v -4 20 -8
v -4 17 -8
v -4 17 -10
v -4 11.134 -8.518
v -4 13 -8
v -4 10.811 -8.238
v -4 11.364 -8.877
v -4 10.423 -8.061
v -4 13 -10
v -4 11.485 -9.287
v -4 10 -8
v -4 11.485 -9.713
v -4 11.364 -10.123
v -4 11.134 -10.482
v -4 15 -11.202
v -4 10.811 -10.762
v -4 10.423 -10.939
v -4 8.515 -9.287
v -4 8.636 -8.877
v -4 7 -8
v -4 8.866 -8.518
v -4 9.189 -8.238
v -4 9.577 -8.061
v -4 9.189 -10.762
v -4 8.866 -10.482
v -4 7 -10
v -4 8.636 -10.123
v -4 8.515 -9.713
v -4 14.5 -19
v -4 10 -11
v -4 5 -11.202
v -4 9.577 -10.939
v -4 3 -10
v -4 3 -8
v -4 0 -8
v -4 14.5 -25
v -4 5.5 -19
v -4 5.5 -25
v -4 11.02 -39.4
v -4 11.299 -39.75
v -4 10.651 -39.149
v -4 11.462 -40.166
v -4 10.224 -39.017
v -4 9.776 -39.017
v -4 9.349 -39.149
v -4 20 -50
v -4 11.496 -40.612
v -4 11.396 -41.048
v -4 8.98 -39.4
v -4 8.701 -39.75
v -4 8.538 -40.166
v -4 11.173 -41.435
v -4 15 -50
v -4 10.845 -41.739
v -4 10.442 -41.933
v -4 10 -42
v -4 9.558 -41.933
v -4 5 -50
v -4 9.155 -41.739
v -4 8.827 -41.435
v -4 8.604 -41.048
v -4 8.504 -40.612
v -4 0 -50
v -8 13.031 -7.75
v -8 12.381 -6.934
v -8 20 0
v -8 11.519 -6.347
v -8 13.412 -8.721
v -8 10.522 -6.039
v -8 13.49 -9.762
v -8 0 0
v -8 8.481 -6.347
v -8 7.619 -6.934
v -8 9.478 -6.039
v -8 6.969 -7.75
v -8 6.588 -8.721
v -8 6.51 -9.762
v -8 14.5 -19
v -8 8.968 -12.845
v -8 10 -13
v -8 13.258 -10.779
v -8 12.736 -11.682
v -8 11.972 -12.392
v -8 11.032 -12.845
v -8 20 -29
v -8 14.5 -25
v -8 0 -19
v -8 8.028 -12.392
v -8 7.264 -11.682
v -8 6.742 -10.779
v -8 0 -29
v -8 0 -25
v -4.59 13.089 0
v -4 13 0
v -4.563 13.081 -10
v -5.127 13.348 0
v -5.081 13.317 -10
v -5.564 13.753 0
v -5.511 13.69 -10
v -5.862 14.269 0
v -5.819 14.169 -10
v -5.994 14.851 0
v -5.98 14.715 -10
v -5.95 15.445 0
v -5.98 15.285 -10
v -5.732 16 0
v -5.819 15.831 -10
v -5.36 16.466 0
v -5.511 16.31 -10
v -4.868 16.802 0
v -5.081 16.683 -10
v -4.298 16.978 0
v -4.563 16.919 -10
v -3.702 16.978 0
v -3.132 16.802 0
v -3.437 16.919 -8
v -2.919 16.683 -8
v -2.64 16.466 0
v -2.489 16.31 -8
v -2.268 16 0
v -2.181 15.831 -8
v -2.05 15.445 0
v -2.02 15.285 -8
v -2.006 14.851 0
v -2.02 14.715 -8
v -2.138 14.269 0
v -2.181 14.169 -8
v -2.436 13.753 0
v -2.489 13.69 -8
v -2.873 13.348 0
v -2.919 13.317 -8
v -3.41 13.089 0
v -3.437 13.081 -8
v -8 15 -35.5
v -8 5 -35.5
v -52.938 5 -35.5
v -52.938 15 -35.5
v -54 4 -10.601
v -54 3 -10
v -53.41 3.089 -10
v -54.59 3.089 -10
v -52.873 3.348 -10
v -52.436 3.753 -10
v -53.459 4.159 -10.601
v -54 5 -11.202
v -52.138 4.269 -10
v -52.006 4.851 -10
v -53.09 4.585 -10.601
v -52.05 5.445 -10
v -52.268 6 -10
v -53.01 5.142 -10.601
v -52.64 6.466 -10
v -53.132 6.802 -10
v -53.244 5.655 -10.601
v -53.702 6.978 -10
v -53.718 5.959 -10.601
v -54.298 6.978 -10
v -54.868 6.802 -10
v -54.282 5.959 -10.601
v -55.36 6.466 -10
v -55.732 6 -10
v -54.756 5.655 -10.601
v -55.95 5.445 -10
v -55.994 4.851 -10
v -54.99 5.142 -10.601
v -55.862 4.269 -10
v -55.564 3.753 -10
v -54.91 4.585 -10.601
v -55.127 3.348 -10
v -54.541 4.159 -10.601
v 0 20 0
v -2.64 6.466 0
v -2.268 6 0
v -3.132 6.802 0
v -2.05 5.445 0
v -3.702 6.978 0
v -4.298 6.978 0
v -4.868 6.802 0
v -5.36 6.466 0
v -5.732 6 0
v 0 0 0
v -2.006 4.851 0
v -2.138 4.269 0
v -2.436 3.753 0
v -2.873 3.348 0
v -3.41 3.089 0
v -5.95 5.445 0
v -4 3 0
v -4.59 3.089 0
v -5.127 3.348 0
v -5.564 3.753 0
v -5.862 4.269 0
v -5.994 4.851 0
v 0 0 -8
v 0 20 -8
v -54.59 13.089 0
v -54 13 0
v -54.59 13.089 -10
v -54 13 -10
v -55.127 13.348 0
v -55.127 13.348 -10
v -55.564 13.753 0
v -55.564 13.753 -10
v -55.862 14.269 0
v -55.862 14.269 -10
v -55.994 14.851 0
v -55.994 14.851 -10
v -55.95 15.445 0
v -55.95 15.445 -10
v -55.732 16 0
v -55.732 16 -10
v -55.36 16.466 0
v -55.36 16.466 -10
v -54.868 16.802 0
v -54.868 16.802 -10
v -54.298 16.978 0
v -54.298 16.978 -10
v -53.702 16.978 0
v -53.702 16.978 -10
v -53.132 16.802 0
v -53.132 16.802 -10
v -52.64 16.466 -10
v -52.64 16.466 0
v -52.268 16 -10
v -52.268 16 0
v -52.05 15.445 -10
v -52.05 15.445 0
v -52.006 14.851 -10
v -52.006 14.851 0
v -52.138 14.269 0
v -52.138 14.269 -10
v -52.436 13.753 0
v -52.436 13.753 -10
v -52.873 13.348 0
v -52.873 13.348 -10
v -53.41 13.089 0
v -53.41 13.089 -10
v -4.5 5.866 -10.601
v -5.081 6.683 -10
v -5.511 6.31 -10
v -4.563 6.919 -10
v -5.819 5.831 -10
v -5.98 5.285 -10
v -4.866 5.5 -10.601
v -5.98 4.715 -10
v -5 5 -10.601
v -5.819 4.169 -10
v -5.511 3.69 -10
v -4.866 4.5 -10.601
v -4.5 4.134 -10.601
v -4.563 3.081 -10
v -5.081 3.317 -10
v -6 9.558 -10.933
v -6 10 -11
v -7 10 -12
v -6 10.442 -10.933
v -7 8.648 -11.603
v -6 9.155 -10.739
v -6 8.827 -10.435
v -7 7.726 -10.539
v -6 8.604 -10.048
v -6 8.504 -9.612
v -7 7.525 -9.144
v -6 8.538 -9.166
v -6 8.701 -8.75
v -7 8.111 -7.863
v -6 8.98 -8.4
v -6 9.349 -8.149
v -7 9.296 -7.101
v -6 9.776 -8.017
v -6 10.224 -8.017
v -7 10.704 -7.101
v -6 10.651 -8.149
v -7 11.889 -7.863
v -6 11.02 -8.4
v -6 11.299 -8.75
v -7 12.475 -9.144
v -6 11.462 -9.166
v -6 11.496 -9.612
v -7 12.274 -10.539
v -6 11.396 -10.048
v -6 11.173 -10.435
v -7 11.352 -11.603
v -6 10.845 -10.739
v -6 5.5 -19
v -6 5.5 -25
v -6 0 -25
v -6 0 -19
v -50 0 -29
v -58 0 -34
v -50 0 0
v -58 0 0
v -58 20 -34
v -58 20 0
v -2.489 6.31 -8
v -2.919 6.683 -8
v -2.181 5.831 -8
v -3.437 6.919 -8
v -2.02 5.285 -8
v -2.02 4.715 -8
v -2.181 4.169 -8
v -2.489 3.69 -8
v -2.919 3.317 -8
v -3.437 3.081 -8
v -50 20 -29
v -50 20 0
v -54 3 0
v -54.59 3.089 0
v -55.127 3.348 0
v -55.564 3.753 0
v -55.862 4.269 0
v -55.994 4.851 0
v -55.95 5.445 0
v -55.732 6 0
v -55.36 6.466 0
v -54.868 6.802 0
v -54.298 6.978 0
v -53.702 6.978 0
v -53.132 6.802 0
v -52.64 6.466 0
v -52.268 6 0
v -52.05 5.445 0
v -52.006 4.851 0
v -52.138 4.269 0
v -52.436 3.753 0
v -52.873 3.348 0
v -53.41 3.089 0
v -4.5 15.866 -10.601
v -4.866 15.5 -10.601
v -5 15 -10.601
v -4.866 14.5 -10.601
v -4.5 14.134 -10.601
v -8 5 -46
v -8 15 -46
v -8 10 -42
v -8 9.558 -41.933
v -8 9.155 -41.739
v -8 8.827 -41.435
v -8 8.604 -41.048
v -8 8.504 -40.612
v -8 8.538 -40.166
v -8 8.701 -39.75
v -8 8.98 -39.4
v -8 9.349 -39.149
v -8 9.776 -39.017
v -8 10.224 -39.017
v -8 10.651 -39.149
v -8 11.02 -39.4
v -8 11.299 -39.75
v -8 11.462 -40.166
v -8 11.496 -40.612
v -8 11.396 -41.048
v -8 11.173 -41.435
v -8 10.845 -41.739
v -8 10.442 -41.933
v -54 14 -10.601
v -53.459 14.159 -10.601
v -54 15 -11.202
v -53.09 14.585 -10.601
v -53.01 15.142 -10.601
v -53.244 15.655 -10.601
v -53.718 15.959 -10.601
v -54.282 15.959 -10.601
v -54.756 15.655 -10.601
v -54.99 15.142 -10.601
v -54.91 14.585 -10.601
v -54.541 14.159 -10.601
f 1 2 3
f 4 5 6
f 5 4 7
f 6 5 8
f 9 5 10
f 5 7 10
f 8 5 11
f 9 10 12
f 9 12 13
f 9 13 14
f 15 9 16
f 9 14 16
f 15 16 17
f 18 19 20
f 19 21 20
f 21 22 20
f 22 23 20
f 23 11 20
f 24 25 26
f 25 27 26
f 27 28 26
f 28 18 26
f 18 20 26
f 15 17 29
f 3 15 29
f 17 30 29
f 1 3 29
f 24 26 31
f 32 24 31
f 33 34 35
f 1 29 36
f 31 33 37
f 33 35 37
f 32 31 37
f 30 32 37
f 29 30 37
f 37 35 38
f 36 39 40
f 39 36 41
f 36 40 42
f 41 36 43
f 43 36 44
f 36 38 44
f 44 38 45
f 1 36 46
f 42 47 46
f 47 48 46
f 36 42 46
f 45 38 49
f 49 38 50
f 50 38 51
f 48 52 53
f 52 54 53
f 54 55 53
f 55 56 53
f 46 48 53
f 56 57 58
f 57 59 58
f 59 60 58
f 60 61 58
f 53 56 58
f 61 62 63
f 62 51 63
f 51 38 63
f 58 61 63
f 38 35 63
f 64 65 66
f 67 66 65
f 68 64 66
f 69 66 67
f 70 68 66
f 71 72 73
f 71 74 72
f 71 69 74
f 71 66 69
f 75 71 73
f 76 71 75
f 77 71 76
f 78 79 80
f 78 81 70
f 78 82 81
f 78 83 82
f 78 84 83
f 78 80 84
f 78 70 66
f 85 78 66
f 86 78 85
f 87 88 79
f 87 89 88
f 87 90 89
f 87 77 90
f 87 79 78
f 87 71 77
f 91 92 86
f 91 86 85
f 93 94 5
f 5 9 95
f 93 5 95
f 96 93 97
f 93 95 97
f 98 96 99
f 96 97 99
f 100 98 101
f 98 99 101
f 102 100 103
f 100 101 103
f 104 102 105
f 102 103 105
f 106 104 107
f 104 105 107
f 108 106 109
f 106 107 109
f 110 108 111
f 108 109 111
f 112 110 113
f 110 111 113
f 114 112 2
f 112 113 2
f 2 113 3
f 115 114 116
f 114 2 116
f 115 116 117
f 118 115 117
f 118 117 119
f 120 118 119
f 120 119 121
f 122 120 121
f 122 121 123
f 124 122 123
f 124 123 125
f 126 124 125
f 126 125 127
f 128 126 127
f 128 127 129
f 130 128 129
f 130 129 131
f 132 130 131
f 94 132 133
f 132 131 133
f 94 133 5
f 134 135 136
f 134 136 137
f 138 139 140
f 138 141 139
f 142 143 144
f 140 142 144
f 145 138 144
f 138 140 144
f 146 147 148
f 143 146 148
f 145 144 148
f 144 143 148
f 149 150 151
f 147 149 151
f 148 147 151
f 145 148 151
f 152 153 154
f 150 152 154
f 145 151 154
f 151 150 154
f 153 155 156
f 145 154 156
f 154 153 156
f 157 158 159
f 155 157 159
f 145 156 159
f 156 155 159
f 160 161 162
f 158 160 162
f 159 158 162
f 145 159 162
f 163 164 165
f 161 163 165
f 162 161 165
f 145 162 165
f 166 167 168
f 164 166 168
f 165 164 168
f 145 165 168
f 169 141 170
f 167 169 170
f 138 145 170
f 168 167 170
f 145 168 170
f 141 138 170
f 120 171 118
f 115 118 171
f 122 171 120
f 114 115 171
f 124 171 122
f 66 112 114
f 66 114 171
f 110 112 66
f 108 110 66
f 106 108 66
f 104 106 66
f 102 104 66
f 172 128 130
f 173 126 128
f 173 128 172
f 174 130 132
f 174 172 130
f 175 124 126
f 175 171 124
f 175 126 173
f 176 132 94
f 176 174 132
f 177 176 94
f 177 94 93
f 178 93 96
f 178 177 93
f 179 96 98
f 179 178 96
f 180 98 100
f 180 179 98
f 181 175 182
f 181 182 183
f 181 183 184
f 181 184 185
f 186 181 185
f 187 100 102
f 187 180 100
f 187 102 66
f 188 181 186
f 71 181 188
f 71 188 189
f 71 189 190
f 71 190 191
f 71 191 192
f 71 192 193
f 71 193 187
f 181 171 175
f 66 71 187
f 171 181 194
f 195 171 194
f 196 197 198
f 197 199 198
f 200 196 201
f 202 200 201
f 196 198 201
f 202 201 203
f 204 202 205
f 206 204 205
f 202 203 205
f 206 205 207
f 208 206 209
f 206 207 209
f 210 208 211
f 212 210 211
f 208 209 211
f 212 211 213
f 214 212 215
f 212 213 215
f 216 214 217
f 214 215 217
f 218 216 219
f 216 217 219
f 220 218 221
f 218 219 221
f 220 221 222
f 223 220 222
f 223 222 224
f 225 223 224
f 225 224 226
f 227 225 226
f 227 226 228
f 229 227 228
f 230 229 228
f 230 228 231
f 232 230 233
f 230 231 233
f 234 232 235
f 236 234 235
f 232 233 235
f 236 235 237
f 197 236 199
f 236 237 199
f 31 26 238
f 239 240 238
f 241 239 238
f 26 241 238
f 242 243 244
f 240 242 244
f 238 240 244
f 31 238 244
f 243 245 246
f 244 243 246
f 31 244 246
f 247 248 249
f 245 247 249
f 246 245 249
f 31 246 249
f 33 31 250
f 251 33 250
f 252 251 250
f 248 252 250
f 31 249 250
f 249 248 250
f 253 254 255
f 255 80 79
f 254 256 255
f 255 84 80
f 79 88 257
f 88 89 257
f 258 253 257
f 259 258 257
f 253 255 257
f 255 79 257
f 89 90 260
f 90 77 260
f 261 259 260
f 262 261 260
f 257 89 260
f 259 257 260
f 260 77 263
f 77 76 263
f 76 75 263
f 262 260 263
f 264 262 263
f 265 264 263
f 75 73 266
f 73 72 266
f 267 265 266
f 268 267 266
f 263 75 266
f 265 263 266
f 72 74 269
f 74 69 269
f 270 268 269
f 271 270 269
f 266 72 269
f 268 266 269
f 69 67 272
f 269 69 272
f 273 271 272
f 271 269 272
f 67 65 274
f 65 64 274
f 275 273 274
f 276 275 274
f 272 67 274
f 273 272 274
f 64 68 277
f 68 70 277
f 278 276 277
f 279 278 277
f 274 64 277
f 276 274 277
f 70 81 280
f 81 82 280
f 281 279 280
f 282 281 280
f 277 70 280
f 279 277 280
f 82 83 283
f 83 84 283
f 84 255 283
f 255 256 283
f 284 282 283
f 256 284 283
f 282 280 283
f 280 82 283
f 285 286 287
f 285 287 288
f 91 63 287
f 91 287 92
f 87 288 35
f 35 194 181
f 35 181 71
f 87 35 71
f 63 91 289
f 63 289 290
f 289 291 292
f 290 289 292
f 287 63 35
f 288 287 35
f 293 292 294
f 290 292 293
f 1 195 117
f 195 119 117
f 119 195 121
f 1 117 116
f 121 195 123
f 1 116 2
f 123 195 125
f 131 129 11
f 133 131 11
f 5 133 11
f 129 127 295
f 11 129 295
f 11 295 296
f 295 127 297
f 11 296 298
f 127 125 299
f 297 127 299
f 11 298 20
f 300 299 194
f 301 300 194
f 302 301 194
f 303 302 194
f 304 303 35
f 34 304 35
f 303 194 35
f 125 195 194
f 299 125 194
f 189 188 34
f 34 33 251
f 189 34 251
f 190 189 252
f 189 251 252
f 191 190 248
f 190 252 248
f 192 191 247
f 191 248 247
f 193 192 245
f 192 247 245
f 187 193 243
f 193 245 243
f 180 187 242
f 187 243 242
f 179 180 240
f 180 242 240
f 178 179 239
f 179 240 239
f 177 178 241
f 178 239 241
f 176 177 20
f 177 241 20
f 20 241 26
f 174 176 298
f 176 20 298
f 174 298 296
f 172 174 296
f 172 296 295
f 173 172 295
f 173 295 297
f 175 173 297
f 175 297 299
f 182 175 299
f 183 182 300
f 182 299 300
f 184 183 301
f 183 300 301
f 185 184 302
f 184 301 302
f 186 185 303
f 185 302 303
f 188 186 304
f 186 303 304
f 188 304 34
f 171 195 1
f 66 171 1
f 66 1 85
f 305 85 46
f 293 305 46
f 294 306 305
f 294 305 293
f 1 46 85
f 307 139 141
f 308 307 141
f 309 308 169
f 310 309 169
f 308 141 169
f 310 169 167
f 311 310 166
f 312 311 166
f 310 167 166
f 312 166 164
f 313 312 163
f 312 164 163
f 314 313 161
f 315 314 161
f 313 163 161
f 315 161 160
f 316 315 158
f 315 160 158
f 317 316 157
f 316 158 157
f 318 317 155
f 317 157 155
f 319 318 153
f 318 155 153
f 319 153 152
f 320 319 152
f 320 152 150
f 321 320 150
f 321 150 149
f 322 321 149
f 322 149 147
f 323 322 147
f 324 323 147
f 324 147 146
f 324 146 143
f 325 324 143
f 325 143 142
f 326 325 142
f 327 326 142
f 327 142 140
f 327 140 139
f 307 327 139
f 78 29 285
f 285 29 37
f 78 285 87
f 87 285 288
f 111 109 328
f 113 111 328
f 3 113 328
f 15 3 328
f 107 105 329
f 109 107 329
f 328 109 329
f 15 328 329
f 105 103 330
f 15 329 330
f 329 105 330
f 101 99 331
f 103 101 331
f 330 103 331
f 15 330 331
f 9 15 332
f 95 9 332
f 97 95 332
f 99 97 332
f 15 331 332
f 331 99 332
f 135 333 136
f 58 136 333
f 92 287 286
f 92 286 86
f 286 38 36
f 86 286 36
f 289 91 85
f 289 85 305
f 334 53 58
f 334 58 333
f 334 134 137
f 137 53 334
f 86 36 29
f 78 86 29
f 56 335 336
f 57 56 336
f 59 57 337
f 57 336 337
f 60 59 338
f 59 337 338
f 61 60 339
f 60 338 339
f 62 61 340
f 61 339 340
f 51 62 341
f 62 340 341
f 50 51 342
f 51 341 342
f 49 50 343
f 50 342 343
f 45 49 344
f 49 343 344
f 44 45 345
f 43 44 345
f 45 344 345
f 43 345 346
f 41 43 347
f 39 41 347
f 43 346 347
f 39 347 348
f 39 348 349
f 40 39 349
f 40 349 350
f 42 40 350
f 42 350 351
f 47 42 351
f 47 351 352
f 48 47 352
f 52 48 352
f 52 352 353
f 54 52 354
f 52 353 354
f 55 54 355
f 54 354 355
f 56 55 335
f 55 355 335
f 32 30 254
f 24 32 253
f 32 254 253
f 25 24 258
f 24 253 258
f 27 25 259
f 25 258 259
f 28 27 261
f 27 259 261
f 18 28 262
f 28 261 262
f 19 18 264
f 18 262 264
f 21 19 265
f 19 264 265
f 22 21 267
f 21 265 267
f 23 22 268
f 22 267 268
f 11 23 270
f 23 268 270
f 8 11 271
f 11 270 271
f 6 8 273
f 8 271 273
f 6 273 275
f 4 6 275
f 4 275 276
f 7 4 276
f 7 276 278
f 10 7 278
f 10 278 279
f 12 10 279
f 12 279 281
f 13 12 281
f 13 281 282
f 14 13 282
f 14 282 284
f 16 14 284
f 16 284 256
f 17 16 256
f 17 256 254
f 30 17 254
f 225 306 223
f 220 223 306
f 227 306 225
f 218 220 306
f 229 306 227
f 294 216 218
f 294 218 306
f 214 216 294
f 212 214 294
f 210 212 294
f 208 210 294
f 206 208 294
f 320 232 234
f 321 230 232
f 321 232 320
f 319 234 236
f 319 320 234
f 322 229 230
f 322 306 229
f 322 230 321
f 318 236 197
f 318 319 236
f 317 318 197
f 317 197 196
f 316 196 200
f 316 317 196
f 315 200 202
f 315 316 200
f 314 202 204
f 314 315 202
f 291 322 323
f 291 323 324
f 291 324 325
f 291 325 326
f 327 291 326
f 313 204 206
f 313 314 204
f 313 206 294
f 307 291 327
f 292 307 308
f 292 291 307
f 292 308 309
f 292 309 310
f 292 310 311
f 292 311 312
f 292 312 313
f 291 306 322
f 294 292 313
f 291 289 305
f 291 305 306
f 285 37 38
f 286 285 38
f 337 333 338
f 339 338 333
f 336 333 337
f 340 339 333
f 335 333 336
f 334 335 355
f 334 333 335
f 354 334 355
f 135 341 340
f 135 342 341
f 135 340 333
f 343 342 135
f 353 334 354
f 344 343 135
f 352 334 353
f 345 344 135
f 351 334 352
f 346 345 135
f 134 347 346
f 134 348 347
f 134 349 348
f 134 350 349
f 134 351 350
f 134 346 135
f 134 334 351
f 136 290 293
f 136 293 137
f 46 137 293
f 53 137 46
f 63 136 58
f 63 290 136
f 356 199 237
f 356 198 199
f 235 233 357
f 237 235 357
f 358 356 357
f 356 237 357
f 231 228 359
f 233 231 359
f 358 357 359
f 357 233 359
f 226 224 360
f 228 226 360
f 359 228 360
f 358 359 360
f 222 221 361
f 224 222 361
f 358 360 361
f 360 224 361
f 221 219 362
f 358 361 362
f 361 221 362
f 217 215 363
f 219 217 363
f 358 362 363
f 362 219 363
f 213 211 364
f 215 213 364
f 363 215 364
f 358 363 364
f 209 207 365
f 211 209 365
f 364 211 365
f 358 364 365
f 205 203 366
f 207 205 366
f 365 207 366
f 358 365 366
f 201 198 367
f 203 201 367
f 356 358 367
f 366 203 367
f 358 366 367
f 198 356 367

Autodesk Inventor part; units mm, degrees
ref_plane "YZ Plane" through (0, 0, 0) normal (1, 0, 0) x (0, 1, 0)
ref_plane "XZ Plane" through (0, 0, 0) normal (0, 1, 0) x (-1, 0, 0)
ref_plane "XY Plane" through (0, 0, 0) normal (0, 0, 1) x (1, 0, 0)
sketch "Esquisse1" plane through (0, 0, 0) normal (0, 1, 0) x (-1, 0, 0)
  line L0 (0, 0) -> (0, -8)
  line L1 (0, 0) -> (8, 0)
  line L2 (8, 0) -> (8, -29)
  line L3 (8, -29) -> (50, -29)
  line L4 (50, -29) -> (50, 0)
  line L5 (0, -8) -> (4, -8)
  line L6 (4, -8) -> (4, -50)
  line L7 (50, 0) -> (58, 0)
  line L8 (58, 0) -> (58, -34)
  line L9 (58, -34) -> (4, -50)
  dimension "d0" = 8
  dimension "d1" = 29
  dimension "d2" = 42
  dimension "d3" = 8
  dimension "d4" = 42
  dimension "d5" = 8
  dimension "d6" = 34
  dimension "d11" = 4
  dimension "d12" = 29
extrude "Extrusion1" add sketch "Esquisse1" along normal blind 20
sketch "Esquisse2" plane through (-58, 0, 0) normal (0, 0, 1) x (1, 0, 0)
  line L0 (0, 20) -> (8, 20) projected
  line L1 (0, 0) -> (8, 0) projected
  line L2 (0, 0) -> (0, 20) projected
  point P0 (58, 0)
  point P1 (4, 15)
  point P2 (4, 5)
  dimension "d15" = 10
  dimension "d17" = 5
  dimension "d18" = 4
  dimension "d19" = 4
hole "Perçage1" at (-54, 15, 0) at (-54, 5, 0) direction (0, 0, -1) diameter 4 depth 10 tip angle 118
sketch "Esquisse3" plane through (-8, 0, 0) normal (0, 0, 1) x (1, 0, 0)
  line L0 (0, 20) -> (8, 20) projected
  line L1 (8, 0) -> (8, 20) projected
  point P0 (4, 15)
  point P1 (4, 5)
  dimension "d27" = 10
  dimension "d28" = 5
  dimension "d29" = 4
  dimension "d30" = 4
hole "Perçage2" at (-4, 15, 0) at (-4, 5, 0) direction (0, 0, -1) diameter 4 depth 10 tip angle 118
sketch "Esquisse4" plane through (-4, 0, -8) normal (1, 0, 0) x (0, 0, -1)
  line L0 (42, 5) -> (27.5, 5)
  line L1 (27.5, 5) -> (27.5, 15)
  line L2 (27.5, 15) -> (42, 15)
  line L3 (42, 15) -> (42, 5)
  line L4 (0, 0) -> (42, 0) projected
  line L5 (42, 0) -> (42, 20) projected
  point P0 (-8, 0)
  dimension "d38" = 10
  dimension "d39" = 14.5
  dimension "d40" = 5
  dimension "d41" = 0
extrude "Extrusion2" cut sketch "Esquisse4" against normal blind 100
sketch "Esquisse5" plane through (-4, 15, -50) normal (0, -1, 0) x (1, 0, 0)
  line L0 (0, 42) -> (0, 0) projected
  line L1 (-4, 21) -> (0, 21)
  line L2 (0, 21) -> (0, 0)
  line L3 (0, 0) -> (-4, 0)
  line L4 (-4, 0) -> (-4, 21)
  point P0 (4, 50)
extrude "Extrusion3" add sketch "Esquisse5" along normal blind 10
sketch "Esquisse6" plane through (-4, 0, -8) normal (1, 0, 0) x (0, 0, -1)
  line L0 (11, 5.5) -> (17, 5.5)
  line L1 (17, 5.5) -> (17, 14.5)
  line L2 (17, 14.5) -> (11, 14.5)
  line L3 (11, 14.5) -> (11, 5.5)
  line L4 (-8, 0) -> (-8, 20) projected
  line L5 (21, 20) -> (-8, 20) projected
  dimension "d49" = 19
  dimension "d50" = 25
  dimension "d51" = 9
  dimension "d52" = 5.5
extrude "Extrusion4" cut sketch "Esquisse6" against normal blind 10
sketch "Esquisse7" plane through (-4, 0, -8) normal (1, 0, 0) x (0, 0, -1)
  line L0 (-8, 0) -> (-8, 20) projected
  line L1 (42, 15) -> (42, 5) projected
  line L2 (21, 0) -> (-8, 0) projected
  line L3 (42, 0) -> (26, 0) projected
  point P0 (1.5, 10)
  point P1 (32.5, 10)
  dimension "d55" = 9.5
  dimension "d56" = 9.5
  dimension "d57" = 10
  dimension "d58" = 10
hole "Perçage3" at (-4, 10, -9.5) at (-4, 10, -40.5) direction (-1, 0, 0) diameter 3 depth 20 tip angle 118
chamfer "Chanfrein2" distance 2 angle 45 1 edges at (-8, 10, -8)
sketch "Esquisse8" plane through (-8, 0, -29) normal (-1, 0, 0) x (0, 0, 1)
  line L0 (4, 14.5) -> (4, 5.5) projected
  line L1 (21, 0) -> (-21, 0) projected
  line L2 (4, 5.5) -> (10, 5.5)
  line L3 (10, 5.5) -> (10, 0)
  line L4 (10, 0) -> (4, 0)
  line L5 (4, 0) -> (4, 5.5)
  point P0 (29, 0)
  dimension "d69" = 6
extrude "Extrusion5" cut sketch "Esquisse8" against normal blind 2
chamfer "Chanfrein3" distance 4 angle 45 1 edges at (-8, 10, -50)
properties part number "supportservopetitrobot"
